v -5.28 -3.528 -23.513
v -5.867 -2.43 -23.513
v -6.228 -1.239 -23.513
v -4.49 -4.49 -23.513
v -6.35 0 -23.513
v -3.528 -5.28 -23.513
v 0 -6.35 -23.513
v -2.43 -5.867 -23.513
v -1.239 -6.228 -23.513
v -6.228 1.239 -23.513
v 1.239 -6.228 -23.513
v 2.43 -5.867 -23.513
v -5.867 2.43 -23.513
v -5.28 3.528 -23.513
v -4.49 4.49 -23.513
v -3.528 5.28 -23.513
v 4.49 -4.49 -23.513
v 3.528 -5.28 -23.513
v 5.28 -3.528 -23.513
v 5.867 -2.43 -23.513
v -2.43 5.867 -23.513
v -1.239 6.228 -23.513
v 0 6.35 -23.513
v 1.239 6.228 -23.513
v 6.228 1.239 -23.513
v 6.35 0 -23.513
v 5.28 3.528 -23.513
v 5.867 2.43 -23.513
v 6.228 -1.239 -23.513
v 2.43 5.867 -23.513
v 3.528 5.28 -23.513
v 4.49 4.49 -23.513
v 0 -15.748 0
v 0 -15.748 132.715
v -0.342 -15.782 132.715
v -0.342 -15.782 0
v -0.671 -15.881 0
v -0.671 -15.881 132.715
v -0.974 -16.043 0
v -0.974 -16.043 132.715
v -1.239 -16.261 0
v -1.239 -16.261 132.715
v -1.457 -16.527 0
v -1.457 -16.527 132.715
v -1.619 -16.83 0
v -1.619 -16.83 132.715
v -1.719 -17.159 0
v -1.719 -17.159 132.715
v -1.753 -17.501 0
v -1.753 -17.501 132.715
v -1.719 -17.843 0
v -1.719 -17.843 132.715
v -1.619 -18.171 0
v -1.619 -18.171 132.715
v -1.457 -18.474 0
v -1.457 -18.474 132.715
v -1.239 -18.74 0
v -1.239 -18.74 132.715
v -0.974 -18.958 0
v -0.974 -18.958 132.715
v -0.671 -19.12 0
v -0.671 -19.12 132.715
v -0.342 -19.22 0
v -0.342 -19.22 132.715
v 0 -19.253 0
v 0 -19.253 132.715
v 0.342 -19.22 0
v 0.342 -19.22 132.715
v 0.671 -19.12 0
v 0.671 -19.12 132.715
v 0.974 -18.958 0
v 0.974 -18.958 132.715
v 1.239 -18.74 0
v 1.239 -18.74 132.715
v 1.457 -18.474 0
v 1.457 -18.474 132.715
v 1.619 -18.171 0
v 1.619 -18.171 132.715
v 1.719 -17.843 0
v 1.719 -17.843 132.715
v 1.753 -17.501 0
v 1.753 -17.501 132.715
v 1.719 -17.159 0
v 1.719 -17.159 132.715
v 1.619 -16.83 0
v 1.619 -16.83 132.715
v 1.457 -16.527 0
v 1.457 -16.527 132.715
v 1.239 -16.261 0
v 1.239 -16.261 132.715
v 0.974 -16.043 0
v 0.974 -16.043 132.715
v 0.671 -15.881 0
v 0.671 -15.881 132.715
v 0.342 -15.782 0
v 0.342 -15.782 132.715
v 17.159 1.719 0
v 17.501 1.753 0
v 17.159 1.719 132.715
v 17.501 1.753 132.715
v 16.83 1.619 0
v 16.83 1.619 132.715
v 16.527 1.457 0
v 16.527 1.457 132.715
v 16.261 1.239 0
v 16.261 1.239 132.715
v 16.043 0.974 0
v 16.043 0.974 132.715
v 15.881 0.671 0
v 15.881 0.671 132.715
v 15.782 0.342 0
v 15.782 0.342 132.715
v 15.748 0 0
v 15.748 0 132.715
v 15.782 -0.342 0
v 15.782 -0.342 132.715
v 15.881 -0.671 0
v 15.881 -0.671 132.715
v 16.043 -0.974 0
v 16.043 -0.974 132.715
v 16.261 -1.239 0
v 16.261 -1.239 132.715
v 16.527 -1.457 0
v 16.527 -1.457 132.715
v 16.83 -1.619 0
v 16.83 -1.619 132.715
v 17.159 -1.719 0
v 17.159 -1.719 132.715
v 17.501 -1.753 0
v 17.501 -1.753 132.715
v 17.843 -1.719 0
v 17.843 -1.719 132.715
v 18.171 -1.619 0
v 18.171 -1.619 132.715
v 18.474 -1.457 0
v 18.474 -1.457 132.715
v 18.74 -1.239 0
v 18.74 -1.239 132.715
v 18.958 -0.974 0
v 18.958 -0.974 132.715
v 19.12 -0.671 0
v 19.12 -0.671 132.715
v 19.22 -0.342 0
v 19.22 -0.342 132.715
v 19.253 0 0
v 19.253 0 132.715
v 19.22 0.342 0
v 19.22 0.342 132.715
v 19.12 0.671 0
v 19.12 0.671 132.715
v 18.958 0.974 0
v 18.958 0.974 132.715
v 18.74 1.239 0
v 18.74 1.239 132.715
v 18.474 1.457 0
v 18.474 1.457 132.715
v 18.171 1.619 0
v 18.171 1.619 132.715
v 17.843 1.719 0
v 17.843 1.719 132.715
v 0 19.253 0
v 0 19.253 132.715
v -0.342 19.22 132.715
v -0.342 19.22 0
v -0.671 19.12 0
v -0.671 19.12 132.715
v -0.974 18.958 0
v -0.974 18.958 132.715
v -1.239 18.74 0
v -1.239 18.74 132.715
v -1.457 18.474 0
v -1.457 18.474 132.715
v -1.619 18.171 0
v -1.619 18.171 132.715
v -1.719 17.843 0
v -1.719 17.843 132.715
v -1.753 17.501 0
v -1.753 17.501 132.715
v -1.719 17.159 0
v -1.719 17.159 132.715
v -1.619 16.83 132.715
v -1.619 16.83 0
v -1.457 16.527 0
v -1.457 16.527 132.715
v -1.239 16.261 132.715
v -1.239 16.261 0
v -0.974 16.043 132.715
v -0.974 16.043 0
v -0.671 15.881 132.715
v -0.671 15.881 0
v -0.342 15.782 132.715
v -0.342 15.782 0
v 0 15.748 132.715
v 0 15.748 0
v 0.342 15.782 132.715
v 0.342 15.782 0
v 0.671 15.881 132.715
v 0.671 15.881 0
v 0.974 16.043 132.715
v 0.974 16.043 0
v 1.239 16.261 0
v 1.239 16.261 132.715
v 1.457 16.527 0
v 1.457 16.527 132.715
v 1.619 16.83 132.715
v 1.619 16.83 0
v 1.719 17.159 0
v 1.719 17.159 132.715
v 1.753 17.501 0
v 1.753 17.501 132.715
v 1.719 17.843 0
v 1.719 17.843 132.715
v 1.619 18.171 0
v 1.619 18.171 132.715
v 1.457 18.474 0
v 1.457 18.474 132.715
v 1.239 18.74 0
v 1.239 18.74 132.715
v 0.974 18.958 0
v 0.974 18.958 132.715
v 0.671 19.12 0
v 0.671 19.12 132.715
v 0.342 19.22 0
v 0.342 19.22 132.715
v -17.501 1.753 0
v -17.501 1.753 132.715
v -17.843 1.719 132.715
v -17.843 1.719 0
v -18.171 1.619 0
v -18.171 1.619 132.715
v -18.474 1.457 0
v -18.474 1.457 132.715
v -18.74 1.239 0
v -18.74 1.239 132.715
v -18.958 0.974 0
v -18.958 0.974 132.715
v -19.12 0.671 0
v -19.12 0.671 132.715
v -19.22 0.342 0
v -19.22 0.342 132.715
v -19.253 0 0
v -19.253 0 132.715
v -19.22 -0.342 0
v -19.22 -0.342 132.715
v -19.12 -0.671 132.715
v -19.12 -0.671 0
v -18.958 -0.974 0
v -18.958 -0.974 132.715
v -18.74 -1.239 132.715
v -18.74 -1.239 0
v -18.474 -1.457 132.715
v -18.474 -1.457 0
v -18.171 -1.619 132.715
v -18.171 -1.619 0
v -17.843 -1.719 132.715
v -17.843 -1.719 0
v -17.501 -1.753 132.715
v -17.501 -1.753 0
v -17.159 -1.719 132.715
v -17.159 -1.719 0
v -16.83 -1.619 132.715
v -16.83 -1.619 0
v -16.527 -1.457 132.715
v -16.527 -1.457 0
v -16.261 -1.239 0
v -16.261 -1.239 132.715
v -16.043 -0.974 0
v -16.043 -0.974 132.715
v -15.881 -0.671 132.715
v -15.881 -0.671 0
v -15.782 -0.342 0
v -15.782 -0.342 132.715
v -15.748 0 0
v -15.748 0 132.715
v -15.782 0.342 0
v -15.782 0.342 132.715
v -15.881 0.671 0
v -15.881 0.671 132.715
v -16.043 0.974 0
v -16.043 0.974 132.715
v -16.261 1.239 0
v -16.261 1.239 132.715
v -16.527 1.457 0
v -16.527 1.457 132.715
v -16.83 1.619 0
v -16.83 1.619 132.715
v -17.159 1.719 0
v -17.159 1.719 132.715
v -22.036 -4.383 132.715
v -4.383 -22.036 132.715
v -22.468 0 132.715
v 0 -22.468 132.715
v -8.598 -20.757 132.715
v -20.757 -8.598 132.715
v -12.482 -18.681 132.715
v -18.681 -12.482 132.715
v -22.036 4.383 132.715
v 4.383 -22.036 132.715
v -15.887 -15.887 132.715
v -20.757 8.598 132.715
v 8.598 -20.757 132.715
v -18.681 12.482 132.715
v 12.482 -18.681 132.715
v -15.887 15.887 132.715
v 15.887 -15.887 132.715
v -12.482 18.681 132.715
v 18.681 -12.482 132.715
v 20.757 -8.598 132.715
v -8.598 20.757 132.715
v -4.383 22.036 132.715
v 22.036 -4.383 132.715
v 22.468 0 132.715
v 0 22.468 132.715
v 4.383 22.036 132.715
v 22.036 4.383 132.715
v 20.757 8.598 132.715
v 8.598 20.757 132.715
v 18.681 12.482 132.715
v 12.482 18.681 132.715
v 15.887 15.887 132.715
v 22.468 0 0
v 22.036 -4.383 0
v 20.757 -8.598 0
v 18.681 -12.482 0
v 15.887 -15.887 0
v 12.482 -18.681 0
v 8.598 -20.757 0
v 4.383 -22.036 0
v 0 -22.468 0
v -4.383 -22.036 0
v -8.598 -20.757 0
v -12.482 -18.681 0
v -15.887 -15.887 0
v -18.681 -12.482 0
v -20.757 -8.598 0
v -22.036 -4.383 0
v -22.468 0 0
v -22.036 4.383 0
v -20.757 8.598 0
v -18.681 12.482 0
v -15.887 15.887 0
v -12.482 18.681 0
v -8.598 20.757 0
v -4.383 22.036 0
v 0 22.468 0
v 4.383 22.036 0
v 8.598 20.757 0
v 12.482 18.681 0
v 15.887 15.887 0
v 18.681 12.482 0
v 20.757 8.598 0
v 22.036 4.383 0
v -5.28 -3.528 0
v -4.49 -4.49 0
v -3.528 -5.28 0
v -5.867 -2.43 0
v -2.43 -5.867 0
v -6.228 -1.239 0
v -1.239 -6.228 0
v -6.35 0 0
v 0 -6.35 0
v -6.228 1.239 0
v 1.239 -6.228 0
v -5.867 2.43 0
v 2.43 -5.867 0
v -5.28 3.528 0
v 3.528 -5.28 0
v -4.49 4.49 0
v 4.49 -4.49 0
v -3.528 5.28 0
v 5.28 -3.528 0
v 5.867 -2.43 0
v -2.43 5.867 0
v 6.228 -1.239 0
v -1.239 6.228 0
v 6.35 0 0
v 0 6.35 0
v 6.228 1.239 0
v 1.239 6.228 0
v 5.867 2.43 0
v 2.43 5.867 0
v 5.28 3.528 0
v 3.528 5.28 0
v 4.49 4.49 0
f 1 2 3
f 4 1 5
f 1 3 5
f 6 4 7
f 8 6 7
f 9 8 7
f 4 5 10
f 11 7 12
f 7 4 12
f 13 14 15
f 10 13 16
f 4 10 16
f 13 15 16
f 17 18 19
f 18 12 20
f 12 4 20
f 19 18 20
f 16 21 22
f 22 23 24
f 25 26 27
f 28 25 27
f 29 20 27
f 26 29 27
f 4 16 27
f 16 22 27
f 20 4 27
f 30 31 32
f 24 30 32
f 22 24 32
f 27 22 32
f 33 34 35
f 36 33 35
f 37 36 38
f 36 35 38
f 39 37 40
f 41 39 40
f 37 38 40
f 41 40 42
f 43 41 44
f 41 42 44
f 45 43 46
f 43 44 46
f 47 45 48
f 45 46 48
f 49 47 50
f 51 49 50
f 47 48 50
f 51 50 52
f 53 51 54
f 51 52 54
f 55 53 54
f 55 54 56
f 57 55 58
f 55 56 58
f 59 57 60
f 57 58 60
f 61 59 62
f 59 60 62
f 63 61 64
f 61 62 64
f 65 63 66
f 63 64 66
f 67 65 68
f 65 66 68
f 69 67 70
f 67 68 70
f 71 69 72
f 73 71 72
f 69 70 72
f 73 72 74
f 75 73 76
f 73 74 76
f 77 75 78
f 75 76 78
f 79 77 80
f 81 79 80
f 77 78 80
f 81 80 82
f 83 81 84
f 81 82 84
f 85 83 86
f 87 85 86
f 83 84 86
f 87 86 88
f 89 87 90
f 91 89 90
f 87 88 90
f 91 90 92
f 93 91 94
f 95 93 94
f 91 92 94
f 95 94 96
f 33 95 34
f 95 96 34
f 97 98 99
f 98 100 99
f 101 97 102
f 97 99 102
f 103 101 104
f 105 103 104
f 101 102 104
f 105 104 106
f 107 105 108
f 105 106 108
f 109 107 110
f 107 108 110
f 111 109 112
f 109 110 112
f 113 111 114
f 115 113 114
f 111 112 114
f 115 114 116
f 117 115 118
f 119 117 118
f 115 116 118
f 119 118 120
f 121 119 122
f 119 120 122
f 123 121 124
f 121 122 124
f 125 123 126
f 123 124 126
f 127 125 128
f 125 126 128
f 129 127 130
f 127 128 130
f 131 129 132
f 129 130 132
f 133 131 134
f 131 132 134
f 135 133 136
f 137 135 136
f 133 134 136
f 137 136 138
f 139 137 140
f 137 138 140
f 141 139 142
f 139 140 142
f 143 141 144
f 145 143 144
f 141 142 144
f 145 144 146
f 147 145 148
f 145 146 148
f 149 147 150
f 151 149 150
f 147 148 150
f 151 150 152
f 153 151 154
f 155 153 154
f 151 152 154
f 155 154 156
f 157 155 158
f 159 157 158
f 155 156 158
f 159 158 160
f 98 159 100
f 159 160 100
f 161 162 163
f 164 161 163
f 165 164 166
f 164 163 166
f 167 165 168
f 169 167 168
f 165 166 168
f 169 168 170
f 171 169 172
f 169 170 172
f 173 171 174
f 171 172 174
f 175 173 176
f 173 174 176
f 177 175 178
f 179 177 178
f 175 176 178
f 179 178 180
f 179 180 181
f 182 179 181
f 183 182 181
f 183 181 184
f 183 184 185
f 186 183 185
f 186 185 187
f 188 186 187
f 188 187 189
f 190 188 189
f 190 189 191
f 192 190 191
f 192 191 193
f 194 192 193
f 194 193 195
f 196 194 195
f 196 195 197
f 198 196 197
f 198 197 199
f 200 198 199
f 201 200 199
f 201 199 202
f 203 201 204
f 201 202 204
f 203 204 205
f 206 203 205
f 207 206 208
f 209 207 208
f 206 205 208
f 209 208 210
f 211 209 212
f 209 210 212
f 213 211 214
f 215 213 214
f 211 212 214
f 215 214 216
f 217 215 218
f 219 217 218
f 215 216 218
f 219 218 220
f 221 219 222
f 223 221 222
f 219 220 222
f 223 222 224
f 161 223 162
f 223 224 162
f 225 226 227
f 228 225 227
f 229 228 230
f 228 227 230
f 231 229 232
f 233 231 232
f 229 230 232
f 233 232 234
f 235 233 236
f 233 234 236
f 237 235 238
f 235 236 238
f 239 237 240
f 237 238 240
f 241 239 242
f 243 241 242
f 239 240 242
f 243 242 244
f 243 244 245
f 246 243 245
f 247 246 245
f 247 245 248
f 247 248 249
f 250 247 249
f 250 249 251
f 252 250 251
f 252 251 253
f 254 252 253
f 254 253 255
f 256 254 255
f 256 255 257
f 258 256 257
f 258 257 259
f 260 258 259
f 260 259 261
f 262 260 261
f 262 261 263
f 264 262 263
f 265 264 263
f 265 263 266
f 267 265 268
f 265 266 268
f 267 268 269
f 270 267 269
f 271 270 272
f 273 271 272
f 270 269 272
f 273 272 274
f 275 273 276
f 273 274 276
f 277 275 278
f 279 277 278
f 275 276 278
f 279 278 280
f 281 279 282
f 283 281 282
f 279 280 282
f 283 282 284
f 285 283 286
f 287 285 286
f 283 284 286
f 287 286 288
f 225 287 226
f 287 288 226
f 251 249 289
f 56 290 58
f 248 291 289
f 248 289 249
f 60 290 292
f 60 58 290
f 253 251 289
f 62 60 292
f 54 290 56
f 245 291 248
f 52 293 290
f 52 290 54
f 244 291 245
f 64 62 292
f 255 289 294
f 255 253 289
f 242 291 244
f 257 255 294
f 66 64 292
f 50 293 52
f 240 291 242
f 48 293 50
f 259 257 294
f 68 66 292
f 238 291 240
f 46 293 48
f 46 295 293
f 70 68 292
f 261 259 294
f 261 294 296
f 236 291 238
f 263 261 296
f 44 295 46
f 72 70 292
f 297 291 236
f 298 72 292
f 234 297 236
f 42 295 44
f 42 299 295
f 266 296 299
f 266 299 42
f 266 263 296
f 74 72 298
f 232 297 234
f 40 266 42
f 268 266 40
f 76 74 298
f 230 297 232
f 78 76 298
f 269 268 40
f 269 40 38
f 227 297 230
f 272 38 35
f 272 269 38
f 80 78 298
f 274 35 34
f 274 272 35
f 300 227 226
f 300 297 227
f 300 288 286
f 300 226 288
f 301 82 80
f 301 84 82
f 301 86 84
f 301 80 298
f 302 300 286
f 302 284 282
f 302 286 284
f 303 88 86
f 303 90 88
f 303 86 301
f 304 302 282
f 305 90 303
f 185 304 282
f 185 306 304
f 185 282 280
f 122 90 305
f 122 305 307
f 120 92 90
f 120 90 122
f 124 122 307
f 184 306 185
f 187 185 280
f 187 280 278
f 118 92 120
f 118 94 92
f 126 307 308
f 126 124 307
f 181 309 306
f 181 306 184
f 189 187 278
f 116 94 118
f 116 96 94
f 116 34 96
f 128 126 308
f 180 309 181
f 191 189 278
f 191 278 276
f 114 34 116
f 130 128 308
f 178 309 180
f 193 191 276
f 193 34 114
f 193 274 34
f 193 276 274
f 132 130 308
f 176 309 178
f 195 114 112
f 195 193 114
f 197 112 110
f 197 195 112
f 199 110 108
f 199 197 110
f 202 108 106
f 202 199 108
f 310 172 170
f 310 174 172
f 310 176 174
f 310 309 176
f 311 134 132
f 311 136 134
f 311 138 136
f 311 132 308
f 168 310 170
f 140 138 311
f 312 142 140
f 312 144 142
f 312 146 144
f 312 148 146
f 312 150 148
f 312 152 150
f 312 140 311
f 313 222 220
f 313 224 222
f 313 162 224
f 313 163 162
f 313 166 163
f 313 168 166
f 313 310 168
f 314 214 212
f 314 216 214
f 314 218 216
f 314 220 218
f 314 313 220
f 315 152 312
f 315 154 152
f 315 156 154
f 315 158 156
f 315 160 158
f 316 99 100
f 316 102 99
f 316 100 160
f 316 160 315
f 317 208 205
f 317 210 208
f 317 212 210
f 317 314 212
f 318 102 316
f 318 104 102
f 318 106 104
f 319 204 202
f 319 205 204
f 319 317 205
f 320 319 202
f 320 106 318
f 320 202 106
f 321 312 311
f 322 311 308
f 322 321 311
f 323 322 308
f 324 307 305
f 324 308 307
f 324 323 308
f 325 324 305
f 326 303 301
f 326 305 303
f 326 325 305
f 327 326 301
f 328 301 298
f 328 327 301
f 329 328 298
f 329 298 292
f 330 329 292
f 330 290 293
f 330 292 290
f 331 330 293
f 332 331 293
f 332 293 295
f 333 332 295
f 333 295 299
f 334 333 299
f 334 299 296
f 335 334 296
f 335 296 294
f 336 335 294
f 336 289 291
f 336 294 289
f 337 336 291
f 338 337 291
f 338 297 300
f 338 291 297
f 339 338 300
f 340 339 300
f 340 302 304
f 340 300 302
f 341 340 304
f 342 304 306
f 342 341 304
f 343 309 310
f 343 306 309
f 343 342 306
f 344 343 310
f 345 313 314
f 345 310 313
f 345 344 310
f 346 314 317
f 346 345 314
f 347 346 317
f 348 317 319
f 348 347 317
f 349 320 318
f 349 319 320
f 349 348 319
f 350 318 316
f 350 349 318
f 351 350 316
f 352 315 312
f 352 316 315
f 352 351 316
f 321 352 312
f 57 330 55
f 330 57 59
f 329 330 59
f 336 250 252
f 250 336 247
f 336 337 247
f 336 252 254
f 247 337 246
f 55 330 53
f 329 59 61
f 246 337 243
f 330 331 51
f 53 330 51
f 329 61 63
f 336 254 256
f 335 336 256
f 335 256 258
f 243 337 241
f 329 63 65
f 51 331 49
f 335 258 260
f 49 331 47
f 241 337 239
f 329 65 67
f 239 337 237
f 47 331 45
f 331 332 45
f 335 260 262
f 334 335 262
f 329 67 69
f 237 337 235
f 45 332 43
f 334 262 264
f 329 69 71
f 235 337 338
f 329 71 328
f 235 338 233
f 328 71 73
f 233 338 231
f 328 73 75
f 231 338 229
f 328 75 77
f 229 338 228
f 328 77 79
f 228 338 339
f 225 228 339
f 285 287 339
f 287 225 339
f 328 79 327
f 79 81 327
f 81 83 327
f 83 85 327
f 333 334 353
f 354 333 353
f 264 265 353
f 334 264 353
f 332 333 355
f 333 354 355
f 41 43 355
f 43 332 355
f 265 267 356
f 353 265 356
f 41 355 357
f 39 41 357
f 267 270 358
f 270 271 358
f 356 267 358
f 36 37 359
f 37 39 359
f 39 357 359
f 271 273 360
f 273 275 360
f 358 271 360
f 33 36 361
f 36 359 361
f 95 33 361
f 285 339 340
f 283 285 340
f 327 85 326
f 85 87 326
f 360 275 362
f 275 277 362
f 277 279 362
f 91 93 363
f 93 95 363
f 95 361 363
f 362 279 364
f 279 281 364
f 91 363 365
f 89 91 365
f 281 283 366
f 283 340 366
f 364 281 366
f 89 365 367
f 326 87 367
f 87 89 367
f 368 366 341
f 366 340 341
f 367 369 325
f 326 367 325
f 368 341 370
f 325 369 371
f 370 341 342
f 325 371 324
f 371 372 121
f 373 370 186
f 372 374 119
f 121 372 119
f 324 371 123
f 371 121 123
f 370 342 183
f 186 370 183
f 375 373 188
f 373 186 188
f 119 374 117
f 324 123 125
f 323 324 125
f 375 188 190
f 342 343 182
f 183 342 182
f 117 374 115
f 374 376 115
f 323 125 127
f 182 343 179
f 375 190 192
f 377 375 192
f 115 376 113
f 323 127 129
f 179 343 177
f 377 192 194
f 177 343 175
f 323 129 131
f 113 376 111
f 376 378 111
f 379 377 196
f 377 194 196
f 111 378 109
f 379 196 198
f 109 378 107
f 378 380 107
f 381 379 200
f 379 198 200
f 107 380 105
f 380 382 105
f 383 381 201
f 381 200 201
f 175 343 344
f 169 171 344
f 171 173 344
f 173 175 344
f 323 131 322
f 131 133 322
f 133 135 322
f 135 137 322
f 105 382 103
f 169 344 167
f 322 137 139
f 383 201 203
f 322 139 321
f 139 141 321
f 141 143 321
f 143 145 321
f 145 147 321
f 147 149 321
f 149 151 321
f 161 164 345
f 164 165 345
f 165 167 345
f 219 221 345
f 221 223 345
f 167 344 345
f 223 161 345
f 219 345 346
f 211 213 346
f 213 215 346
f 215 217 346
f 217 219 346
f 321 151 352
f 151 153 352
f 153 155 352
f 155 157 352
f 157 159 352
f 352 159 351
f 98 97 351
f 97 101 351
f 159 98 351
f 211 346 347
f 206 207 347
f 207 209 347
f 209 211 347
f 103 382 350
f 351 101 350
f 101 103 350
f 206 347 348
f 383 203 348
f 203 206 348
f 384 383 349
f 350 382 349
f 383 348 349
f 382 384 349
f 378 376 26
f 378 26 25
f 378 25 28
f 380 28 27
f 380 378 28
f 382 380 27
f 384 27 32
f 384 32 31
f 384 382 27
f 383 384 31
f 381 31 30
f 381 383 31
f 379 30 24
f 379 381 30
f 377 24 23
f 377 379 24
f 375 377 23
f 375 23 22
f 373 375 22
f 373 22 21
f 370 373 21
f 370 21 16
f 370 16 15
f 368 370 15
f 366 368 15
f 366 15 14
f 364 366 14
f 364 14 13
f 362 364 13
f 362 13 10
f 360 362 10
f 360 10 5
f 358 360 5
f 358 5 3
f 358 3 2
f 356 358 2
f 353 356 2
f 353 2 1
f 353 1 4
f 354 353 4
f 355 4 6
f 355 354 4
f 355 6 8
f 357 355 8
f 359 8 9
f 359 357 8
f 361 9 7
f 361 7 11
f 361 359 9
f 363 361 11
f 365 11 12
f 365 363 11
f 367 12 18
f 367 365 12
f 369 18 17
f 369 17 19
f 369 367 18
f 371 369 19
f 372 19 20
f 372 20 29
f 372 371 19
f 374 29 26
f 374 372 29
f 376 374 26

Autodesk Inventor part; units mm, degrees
ref_plane "YZ Plane" through (0, 0, 0) normal (1, 0, 0) x (0, 1, 0)
ref_plane "XZ Plane" through (0, 0, 0) normal (0, 1, 0) x (-1, 0, 0)
ref_plane "XY Plane" through (0, 0, 0) normal (0, 0, 1) x (1, 0, 0)
sketch "Sketch1" plane through (0, 0, 0) normal (0, 0, 1) x (1, 0, 0)
  circle A0 centre (0, 0) radius 22.4676
  circle A1 centre (0, 0) radius 6.35
  point P0 (0, 17.5006)
  point P1 (-17.5006, 0)
  point P2 (0, -17.5006)
  point P3 (17.5006, 0)
  dimension "d0" = 44.9351
  dimension "d1" = 12.7
  dimension "d6" = 35.0012
  dimension "d7" = 17.5006
  dimension "d8" = 17.5006
  dimension "d9" = 17.5006
  dimension "d10" = 17.5006
extrude "Extrusion1" add sketch "Sketch1" along normal blind 132.715 contours A0 | A1
extrude "Extrusion2" add sketch "Sketch1" against normal blind 23.5128 contours A1
hole "Hole1" at (0, 17.5006, 0) at (-17.5006, 0, 0) at (0, -17.5006, 0) at (17.5006, 0, 0) direction (0, 0, 1) diameter 3.5052 end through all
thread "Thread1" size "6-32 UNC" class "2B" standard "ANSI Unified Screw Threads" full length
thread "Thread2" size "6-32 UNC" class "2B" standard "ANSI Unified Screw Threads" full length
thread "Thread3" size "6-32 UNC" class "2B" standard "ANSI Unified Screw Threads" full length
thread "Thread4" size "6-32 UNC" class "2B" standard "ANSI Unified Screw Threads" full length
